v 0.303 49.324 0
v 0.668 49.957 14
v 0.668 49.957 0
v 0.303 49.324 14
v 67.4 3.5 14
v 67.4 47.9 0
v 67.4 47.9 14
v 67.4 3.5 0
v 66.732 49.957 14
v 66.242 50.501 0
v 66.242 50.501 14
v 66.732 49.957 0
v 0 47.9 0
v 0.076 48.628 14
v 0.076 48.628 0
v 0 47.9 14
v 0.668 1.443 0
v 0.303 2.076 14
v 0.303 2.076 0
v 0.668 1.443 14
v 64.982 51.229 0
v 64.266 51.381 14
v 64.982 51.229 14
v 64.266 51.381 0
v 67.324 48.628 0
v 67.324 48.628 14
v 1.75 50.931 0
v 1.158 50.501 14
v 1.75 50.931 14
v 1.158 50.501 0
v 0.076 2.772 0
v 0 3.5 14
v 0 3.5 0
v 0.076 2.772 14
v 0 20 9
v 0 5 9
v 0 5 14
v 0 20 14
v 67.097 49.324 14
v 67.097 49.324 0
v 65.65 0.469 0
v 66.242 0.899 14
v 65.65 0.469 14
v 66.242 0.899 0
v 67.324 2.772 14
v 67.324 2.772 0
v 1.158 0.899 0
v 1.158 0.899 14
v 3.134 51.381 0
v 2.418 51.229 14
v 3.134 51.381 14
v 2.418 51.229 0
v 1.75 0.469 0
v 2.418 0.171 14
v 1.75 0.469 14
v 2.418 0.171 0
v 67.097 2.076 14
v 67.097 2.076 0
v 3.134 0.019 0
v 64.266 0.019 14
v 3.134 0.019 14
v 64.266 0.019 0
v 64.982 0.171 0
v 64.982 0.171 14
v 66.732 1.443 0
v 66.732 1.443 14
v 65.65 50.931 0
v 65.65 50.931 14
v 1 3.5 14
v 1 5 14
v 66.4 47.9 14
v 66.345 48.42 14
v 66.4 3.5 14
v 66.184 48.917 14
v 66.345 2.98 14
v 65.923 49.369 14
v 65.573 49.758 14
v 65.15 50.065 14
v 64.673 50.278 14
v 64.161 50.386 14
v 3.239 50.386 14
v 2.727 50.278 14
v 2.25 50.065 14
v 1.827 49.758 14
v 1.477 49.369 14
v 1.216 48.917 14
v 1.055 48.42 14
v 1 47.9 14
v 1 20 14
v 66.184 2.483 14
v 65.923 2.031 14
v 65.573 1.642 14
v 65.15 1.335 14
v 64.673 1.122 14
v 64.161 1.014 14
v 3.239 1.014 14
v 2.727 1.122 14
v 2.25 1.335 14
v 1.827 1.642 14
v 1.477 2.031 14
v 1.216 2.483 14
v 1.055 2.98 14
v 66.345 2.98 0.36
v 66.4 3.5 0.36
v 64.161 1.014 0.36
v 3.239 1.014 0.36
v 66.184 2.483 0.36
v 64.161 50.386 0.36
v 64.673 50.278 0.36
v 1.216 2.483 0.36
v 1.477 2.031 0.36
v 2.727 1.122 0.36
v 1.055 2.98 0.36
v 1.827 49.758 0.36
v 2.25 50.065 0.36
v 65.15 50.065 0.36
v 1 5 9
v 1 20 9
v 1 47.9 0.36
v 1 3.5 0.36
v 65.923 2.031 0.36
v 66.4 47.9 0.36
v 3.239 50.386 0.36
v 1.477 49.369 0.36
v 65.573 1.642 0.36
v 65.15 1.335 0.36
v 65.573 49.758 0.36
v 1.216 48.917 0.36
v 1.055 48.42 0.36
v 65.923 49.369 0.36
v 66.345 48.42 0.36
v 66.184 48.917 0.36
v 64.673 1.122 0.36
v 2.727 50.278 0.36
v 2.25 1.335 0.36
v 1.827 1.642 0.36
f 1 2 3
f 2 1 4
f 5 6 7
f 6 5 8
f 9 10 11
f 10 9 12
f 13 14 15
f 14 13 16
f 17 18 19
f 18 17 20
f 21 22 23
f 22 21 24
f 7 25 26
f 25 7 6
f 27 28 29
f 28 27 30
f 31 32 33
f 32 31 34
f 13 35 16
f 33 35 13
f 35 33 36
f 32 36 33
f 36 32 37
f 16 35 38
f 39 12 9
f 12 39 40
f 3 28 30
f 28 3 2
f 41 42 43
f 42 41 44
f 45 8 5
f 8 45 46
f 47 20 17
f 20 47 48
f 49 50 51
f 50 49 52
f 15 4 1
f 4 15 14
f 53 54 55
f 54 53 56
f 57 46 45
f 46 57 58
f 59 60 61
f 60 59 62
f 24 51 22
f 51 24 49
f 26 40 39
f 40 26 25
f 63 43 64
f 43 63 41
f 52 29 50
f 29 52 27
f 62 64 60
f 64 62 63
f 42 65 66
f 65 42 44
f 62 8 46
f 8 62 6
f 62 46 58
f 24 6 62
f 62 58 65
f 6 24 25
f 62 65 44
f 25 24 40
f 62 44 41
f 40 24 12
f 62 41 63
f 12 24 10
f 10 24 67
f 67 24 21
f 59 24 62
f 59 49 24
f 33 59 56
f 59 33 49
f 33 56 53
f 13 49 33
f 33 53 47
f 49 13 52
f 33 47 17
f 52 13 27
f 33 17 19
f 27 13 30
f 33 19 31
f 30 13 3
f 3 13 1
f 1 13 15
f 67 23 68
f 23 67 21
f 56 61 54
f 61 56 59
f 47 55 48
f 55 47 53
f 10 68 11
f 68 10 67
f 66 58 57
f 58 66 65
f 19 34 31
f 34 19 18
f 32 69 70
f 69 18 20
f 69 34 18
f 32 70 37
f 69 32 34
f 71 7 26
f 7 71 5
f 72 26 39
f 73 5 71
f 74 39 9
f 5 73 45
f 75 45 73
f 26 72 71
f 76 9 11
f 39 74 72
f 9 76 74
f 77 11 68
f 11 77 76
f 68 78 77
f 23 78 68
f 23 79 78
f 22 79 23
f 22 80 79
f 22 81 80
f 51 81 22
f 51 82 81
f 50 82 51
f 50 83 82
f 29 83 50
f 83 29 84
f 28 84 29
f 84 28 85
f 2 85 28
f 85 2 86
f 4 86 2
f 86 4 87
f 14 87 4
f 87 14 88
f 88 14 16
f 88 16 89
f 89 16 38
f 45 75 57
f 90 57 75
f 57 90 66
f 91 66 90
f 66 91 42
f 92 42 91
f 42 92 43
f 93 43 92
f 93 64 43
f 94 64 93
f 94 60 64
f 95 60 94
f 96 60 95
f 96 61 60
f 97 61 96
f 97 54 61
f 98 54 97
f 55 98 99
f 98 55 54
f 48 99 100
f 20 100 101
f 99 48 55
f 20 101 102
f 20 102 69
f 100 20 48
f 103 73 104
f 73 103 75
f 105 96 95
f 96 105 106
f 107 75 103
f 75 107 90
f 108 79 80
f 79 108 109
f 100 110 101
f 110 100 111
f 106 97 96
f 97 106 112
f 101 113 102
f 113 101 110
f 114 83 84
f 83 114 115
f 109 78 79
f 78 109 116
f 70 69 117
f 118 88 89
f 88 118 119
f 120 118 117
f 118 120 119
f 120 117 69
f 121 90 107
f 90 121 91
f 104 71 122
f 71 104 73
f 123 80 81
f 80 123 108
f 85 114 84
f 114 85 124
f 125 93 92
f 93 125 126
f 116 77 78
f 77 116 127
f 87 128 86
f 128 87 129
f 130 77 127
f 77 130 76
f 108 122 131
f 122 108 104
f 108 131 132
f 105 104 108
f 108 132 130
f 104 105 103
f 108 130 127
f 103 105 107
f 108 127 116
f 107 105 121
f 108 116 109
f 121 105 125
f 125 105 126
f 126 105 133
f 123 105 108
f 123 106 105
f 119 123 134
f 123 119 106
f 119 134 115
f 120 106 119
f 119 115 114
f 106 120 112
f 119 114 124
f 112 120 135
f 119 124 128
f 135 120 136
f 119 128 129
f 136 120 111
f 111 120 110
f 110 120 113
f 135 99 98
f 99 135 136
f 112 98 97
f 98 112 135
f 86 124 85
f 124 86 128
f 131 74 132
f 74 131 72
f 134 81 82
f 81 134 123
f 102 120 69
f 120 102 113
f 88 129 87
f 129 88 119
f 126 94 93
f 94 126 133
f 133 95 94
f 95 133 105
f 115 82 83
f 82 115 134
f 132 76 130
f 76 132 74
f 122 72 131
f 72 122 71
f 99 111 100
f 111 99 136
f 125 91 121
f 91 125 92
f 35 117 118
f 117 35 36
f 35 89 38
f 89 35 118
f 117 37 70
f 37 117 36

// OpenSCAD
$fn = 30;


tp_h = 1.6;
tp_w = 65.4;
tp_d = 49.4;
tp_r = 2.5;
overlay_h = 0.36;

wall_t = 1;
plate_t = 0.6;

box_h = 14;
box_w = tp_w + 2*wall_t;
box_d = tp_d + 2*wall_t;
box_r = tp_r + wall_t;

module rounded_cube(x, y, z, r) {
    hull() {
        translate([r, r, 0])
        cylinder(r=r, h=z);
        translate([x-r, r, 0])
        cylinder(r=r, h=z);
        translate([x-r, y-r, 0])
        cylinder(r=r, h=z);
        translate([r, y-r, 0])
        cylinder(r=r, h=z);
    }
}


module touchpad_case() {
    difference() {
        rounded_cube(box_w, box_d, box_h, box_r);
        translate([wall_t, wall_t, overlay_h])
            rounded_cube(tp_w, tp_d, box_h, tp_r);
        translate([-5, 5, 9])
            cube([10, 15, 10]);
    }
}

touchpad_case();
